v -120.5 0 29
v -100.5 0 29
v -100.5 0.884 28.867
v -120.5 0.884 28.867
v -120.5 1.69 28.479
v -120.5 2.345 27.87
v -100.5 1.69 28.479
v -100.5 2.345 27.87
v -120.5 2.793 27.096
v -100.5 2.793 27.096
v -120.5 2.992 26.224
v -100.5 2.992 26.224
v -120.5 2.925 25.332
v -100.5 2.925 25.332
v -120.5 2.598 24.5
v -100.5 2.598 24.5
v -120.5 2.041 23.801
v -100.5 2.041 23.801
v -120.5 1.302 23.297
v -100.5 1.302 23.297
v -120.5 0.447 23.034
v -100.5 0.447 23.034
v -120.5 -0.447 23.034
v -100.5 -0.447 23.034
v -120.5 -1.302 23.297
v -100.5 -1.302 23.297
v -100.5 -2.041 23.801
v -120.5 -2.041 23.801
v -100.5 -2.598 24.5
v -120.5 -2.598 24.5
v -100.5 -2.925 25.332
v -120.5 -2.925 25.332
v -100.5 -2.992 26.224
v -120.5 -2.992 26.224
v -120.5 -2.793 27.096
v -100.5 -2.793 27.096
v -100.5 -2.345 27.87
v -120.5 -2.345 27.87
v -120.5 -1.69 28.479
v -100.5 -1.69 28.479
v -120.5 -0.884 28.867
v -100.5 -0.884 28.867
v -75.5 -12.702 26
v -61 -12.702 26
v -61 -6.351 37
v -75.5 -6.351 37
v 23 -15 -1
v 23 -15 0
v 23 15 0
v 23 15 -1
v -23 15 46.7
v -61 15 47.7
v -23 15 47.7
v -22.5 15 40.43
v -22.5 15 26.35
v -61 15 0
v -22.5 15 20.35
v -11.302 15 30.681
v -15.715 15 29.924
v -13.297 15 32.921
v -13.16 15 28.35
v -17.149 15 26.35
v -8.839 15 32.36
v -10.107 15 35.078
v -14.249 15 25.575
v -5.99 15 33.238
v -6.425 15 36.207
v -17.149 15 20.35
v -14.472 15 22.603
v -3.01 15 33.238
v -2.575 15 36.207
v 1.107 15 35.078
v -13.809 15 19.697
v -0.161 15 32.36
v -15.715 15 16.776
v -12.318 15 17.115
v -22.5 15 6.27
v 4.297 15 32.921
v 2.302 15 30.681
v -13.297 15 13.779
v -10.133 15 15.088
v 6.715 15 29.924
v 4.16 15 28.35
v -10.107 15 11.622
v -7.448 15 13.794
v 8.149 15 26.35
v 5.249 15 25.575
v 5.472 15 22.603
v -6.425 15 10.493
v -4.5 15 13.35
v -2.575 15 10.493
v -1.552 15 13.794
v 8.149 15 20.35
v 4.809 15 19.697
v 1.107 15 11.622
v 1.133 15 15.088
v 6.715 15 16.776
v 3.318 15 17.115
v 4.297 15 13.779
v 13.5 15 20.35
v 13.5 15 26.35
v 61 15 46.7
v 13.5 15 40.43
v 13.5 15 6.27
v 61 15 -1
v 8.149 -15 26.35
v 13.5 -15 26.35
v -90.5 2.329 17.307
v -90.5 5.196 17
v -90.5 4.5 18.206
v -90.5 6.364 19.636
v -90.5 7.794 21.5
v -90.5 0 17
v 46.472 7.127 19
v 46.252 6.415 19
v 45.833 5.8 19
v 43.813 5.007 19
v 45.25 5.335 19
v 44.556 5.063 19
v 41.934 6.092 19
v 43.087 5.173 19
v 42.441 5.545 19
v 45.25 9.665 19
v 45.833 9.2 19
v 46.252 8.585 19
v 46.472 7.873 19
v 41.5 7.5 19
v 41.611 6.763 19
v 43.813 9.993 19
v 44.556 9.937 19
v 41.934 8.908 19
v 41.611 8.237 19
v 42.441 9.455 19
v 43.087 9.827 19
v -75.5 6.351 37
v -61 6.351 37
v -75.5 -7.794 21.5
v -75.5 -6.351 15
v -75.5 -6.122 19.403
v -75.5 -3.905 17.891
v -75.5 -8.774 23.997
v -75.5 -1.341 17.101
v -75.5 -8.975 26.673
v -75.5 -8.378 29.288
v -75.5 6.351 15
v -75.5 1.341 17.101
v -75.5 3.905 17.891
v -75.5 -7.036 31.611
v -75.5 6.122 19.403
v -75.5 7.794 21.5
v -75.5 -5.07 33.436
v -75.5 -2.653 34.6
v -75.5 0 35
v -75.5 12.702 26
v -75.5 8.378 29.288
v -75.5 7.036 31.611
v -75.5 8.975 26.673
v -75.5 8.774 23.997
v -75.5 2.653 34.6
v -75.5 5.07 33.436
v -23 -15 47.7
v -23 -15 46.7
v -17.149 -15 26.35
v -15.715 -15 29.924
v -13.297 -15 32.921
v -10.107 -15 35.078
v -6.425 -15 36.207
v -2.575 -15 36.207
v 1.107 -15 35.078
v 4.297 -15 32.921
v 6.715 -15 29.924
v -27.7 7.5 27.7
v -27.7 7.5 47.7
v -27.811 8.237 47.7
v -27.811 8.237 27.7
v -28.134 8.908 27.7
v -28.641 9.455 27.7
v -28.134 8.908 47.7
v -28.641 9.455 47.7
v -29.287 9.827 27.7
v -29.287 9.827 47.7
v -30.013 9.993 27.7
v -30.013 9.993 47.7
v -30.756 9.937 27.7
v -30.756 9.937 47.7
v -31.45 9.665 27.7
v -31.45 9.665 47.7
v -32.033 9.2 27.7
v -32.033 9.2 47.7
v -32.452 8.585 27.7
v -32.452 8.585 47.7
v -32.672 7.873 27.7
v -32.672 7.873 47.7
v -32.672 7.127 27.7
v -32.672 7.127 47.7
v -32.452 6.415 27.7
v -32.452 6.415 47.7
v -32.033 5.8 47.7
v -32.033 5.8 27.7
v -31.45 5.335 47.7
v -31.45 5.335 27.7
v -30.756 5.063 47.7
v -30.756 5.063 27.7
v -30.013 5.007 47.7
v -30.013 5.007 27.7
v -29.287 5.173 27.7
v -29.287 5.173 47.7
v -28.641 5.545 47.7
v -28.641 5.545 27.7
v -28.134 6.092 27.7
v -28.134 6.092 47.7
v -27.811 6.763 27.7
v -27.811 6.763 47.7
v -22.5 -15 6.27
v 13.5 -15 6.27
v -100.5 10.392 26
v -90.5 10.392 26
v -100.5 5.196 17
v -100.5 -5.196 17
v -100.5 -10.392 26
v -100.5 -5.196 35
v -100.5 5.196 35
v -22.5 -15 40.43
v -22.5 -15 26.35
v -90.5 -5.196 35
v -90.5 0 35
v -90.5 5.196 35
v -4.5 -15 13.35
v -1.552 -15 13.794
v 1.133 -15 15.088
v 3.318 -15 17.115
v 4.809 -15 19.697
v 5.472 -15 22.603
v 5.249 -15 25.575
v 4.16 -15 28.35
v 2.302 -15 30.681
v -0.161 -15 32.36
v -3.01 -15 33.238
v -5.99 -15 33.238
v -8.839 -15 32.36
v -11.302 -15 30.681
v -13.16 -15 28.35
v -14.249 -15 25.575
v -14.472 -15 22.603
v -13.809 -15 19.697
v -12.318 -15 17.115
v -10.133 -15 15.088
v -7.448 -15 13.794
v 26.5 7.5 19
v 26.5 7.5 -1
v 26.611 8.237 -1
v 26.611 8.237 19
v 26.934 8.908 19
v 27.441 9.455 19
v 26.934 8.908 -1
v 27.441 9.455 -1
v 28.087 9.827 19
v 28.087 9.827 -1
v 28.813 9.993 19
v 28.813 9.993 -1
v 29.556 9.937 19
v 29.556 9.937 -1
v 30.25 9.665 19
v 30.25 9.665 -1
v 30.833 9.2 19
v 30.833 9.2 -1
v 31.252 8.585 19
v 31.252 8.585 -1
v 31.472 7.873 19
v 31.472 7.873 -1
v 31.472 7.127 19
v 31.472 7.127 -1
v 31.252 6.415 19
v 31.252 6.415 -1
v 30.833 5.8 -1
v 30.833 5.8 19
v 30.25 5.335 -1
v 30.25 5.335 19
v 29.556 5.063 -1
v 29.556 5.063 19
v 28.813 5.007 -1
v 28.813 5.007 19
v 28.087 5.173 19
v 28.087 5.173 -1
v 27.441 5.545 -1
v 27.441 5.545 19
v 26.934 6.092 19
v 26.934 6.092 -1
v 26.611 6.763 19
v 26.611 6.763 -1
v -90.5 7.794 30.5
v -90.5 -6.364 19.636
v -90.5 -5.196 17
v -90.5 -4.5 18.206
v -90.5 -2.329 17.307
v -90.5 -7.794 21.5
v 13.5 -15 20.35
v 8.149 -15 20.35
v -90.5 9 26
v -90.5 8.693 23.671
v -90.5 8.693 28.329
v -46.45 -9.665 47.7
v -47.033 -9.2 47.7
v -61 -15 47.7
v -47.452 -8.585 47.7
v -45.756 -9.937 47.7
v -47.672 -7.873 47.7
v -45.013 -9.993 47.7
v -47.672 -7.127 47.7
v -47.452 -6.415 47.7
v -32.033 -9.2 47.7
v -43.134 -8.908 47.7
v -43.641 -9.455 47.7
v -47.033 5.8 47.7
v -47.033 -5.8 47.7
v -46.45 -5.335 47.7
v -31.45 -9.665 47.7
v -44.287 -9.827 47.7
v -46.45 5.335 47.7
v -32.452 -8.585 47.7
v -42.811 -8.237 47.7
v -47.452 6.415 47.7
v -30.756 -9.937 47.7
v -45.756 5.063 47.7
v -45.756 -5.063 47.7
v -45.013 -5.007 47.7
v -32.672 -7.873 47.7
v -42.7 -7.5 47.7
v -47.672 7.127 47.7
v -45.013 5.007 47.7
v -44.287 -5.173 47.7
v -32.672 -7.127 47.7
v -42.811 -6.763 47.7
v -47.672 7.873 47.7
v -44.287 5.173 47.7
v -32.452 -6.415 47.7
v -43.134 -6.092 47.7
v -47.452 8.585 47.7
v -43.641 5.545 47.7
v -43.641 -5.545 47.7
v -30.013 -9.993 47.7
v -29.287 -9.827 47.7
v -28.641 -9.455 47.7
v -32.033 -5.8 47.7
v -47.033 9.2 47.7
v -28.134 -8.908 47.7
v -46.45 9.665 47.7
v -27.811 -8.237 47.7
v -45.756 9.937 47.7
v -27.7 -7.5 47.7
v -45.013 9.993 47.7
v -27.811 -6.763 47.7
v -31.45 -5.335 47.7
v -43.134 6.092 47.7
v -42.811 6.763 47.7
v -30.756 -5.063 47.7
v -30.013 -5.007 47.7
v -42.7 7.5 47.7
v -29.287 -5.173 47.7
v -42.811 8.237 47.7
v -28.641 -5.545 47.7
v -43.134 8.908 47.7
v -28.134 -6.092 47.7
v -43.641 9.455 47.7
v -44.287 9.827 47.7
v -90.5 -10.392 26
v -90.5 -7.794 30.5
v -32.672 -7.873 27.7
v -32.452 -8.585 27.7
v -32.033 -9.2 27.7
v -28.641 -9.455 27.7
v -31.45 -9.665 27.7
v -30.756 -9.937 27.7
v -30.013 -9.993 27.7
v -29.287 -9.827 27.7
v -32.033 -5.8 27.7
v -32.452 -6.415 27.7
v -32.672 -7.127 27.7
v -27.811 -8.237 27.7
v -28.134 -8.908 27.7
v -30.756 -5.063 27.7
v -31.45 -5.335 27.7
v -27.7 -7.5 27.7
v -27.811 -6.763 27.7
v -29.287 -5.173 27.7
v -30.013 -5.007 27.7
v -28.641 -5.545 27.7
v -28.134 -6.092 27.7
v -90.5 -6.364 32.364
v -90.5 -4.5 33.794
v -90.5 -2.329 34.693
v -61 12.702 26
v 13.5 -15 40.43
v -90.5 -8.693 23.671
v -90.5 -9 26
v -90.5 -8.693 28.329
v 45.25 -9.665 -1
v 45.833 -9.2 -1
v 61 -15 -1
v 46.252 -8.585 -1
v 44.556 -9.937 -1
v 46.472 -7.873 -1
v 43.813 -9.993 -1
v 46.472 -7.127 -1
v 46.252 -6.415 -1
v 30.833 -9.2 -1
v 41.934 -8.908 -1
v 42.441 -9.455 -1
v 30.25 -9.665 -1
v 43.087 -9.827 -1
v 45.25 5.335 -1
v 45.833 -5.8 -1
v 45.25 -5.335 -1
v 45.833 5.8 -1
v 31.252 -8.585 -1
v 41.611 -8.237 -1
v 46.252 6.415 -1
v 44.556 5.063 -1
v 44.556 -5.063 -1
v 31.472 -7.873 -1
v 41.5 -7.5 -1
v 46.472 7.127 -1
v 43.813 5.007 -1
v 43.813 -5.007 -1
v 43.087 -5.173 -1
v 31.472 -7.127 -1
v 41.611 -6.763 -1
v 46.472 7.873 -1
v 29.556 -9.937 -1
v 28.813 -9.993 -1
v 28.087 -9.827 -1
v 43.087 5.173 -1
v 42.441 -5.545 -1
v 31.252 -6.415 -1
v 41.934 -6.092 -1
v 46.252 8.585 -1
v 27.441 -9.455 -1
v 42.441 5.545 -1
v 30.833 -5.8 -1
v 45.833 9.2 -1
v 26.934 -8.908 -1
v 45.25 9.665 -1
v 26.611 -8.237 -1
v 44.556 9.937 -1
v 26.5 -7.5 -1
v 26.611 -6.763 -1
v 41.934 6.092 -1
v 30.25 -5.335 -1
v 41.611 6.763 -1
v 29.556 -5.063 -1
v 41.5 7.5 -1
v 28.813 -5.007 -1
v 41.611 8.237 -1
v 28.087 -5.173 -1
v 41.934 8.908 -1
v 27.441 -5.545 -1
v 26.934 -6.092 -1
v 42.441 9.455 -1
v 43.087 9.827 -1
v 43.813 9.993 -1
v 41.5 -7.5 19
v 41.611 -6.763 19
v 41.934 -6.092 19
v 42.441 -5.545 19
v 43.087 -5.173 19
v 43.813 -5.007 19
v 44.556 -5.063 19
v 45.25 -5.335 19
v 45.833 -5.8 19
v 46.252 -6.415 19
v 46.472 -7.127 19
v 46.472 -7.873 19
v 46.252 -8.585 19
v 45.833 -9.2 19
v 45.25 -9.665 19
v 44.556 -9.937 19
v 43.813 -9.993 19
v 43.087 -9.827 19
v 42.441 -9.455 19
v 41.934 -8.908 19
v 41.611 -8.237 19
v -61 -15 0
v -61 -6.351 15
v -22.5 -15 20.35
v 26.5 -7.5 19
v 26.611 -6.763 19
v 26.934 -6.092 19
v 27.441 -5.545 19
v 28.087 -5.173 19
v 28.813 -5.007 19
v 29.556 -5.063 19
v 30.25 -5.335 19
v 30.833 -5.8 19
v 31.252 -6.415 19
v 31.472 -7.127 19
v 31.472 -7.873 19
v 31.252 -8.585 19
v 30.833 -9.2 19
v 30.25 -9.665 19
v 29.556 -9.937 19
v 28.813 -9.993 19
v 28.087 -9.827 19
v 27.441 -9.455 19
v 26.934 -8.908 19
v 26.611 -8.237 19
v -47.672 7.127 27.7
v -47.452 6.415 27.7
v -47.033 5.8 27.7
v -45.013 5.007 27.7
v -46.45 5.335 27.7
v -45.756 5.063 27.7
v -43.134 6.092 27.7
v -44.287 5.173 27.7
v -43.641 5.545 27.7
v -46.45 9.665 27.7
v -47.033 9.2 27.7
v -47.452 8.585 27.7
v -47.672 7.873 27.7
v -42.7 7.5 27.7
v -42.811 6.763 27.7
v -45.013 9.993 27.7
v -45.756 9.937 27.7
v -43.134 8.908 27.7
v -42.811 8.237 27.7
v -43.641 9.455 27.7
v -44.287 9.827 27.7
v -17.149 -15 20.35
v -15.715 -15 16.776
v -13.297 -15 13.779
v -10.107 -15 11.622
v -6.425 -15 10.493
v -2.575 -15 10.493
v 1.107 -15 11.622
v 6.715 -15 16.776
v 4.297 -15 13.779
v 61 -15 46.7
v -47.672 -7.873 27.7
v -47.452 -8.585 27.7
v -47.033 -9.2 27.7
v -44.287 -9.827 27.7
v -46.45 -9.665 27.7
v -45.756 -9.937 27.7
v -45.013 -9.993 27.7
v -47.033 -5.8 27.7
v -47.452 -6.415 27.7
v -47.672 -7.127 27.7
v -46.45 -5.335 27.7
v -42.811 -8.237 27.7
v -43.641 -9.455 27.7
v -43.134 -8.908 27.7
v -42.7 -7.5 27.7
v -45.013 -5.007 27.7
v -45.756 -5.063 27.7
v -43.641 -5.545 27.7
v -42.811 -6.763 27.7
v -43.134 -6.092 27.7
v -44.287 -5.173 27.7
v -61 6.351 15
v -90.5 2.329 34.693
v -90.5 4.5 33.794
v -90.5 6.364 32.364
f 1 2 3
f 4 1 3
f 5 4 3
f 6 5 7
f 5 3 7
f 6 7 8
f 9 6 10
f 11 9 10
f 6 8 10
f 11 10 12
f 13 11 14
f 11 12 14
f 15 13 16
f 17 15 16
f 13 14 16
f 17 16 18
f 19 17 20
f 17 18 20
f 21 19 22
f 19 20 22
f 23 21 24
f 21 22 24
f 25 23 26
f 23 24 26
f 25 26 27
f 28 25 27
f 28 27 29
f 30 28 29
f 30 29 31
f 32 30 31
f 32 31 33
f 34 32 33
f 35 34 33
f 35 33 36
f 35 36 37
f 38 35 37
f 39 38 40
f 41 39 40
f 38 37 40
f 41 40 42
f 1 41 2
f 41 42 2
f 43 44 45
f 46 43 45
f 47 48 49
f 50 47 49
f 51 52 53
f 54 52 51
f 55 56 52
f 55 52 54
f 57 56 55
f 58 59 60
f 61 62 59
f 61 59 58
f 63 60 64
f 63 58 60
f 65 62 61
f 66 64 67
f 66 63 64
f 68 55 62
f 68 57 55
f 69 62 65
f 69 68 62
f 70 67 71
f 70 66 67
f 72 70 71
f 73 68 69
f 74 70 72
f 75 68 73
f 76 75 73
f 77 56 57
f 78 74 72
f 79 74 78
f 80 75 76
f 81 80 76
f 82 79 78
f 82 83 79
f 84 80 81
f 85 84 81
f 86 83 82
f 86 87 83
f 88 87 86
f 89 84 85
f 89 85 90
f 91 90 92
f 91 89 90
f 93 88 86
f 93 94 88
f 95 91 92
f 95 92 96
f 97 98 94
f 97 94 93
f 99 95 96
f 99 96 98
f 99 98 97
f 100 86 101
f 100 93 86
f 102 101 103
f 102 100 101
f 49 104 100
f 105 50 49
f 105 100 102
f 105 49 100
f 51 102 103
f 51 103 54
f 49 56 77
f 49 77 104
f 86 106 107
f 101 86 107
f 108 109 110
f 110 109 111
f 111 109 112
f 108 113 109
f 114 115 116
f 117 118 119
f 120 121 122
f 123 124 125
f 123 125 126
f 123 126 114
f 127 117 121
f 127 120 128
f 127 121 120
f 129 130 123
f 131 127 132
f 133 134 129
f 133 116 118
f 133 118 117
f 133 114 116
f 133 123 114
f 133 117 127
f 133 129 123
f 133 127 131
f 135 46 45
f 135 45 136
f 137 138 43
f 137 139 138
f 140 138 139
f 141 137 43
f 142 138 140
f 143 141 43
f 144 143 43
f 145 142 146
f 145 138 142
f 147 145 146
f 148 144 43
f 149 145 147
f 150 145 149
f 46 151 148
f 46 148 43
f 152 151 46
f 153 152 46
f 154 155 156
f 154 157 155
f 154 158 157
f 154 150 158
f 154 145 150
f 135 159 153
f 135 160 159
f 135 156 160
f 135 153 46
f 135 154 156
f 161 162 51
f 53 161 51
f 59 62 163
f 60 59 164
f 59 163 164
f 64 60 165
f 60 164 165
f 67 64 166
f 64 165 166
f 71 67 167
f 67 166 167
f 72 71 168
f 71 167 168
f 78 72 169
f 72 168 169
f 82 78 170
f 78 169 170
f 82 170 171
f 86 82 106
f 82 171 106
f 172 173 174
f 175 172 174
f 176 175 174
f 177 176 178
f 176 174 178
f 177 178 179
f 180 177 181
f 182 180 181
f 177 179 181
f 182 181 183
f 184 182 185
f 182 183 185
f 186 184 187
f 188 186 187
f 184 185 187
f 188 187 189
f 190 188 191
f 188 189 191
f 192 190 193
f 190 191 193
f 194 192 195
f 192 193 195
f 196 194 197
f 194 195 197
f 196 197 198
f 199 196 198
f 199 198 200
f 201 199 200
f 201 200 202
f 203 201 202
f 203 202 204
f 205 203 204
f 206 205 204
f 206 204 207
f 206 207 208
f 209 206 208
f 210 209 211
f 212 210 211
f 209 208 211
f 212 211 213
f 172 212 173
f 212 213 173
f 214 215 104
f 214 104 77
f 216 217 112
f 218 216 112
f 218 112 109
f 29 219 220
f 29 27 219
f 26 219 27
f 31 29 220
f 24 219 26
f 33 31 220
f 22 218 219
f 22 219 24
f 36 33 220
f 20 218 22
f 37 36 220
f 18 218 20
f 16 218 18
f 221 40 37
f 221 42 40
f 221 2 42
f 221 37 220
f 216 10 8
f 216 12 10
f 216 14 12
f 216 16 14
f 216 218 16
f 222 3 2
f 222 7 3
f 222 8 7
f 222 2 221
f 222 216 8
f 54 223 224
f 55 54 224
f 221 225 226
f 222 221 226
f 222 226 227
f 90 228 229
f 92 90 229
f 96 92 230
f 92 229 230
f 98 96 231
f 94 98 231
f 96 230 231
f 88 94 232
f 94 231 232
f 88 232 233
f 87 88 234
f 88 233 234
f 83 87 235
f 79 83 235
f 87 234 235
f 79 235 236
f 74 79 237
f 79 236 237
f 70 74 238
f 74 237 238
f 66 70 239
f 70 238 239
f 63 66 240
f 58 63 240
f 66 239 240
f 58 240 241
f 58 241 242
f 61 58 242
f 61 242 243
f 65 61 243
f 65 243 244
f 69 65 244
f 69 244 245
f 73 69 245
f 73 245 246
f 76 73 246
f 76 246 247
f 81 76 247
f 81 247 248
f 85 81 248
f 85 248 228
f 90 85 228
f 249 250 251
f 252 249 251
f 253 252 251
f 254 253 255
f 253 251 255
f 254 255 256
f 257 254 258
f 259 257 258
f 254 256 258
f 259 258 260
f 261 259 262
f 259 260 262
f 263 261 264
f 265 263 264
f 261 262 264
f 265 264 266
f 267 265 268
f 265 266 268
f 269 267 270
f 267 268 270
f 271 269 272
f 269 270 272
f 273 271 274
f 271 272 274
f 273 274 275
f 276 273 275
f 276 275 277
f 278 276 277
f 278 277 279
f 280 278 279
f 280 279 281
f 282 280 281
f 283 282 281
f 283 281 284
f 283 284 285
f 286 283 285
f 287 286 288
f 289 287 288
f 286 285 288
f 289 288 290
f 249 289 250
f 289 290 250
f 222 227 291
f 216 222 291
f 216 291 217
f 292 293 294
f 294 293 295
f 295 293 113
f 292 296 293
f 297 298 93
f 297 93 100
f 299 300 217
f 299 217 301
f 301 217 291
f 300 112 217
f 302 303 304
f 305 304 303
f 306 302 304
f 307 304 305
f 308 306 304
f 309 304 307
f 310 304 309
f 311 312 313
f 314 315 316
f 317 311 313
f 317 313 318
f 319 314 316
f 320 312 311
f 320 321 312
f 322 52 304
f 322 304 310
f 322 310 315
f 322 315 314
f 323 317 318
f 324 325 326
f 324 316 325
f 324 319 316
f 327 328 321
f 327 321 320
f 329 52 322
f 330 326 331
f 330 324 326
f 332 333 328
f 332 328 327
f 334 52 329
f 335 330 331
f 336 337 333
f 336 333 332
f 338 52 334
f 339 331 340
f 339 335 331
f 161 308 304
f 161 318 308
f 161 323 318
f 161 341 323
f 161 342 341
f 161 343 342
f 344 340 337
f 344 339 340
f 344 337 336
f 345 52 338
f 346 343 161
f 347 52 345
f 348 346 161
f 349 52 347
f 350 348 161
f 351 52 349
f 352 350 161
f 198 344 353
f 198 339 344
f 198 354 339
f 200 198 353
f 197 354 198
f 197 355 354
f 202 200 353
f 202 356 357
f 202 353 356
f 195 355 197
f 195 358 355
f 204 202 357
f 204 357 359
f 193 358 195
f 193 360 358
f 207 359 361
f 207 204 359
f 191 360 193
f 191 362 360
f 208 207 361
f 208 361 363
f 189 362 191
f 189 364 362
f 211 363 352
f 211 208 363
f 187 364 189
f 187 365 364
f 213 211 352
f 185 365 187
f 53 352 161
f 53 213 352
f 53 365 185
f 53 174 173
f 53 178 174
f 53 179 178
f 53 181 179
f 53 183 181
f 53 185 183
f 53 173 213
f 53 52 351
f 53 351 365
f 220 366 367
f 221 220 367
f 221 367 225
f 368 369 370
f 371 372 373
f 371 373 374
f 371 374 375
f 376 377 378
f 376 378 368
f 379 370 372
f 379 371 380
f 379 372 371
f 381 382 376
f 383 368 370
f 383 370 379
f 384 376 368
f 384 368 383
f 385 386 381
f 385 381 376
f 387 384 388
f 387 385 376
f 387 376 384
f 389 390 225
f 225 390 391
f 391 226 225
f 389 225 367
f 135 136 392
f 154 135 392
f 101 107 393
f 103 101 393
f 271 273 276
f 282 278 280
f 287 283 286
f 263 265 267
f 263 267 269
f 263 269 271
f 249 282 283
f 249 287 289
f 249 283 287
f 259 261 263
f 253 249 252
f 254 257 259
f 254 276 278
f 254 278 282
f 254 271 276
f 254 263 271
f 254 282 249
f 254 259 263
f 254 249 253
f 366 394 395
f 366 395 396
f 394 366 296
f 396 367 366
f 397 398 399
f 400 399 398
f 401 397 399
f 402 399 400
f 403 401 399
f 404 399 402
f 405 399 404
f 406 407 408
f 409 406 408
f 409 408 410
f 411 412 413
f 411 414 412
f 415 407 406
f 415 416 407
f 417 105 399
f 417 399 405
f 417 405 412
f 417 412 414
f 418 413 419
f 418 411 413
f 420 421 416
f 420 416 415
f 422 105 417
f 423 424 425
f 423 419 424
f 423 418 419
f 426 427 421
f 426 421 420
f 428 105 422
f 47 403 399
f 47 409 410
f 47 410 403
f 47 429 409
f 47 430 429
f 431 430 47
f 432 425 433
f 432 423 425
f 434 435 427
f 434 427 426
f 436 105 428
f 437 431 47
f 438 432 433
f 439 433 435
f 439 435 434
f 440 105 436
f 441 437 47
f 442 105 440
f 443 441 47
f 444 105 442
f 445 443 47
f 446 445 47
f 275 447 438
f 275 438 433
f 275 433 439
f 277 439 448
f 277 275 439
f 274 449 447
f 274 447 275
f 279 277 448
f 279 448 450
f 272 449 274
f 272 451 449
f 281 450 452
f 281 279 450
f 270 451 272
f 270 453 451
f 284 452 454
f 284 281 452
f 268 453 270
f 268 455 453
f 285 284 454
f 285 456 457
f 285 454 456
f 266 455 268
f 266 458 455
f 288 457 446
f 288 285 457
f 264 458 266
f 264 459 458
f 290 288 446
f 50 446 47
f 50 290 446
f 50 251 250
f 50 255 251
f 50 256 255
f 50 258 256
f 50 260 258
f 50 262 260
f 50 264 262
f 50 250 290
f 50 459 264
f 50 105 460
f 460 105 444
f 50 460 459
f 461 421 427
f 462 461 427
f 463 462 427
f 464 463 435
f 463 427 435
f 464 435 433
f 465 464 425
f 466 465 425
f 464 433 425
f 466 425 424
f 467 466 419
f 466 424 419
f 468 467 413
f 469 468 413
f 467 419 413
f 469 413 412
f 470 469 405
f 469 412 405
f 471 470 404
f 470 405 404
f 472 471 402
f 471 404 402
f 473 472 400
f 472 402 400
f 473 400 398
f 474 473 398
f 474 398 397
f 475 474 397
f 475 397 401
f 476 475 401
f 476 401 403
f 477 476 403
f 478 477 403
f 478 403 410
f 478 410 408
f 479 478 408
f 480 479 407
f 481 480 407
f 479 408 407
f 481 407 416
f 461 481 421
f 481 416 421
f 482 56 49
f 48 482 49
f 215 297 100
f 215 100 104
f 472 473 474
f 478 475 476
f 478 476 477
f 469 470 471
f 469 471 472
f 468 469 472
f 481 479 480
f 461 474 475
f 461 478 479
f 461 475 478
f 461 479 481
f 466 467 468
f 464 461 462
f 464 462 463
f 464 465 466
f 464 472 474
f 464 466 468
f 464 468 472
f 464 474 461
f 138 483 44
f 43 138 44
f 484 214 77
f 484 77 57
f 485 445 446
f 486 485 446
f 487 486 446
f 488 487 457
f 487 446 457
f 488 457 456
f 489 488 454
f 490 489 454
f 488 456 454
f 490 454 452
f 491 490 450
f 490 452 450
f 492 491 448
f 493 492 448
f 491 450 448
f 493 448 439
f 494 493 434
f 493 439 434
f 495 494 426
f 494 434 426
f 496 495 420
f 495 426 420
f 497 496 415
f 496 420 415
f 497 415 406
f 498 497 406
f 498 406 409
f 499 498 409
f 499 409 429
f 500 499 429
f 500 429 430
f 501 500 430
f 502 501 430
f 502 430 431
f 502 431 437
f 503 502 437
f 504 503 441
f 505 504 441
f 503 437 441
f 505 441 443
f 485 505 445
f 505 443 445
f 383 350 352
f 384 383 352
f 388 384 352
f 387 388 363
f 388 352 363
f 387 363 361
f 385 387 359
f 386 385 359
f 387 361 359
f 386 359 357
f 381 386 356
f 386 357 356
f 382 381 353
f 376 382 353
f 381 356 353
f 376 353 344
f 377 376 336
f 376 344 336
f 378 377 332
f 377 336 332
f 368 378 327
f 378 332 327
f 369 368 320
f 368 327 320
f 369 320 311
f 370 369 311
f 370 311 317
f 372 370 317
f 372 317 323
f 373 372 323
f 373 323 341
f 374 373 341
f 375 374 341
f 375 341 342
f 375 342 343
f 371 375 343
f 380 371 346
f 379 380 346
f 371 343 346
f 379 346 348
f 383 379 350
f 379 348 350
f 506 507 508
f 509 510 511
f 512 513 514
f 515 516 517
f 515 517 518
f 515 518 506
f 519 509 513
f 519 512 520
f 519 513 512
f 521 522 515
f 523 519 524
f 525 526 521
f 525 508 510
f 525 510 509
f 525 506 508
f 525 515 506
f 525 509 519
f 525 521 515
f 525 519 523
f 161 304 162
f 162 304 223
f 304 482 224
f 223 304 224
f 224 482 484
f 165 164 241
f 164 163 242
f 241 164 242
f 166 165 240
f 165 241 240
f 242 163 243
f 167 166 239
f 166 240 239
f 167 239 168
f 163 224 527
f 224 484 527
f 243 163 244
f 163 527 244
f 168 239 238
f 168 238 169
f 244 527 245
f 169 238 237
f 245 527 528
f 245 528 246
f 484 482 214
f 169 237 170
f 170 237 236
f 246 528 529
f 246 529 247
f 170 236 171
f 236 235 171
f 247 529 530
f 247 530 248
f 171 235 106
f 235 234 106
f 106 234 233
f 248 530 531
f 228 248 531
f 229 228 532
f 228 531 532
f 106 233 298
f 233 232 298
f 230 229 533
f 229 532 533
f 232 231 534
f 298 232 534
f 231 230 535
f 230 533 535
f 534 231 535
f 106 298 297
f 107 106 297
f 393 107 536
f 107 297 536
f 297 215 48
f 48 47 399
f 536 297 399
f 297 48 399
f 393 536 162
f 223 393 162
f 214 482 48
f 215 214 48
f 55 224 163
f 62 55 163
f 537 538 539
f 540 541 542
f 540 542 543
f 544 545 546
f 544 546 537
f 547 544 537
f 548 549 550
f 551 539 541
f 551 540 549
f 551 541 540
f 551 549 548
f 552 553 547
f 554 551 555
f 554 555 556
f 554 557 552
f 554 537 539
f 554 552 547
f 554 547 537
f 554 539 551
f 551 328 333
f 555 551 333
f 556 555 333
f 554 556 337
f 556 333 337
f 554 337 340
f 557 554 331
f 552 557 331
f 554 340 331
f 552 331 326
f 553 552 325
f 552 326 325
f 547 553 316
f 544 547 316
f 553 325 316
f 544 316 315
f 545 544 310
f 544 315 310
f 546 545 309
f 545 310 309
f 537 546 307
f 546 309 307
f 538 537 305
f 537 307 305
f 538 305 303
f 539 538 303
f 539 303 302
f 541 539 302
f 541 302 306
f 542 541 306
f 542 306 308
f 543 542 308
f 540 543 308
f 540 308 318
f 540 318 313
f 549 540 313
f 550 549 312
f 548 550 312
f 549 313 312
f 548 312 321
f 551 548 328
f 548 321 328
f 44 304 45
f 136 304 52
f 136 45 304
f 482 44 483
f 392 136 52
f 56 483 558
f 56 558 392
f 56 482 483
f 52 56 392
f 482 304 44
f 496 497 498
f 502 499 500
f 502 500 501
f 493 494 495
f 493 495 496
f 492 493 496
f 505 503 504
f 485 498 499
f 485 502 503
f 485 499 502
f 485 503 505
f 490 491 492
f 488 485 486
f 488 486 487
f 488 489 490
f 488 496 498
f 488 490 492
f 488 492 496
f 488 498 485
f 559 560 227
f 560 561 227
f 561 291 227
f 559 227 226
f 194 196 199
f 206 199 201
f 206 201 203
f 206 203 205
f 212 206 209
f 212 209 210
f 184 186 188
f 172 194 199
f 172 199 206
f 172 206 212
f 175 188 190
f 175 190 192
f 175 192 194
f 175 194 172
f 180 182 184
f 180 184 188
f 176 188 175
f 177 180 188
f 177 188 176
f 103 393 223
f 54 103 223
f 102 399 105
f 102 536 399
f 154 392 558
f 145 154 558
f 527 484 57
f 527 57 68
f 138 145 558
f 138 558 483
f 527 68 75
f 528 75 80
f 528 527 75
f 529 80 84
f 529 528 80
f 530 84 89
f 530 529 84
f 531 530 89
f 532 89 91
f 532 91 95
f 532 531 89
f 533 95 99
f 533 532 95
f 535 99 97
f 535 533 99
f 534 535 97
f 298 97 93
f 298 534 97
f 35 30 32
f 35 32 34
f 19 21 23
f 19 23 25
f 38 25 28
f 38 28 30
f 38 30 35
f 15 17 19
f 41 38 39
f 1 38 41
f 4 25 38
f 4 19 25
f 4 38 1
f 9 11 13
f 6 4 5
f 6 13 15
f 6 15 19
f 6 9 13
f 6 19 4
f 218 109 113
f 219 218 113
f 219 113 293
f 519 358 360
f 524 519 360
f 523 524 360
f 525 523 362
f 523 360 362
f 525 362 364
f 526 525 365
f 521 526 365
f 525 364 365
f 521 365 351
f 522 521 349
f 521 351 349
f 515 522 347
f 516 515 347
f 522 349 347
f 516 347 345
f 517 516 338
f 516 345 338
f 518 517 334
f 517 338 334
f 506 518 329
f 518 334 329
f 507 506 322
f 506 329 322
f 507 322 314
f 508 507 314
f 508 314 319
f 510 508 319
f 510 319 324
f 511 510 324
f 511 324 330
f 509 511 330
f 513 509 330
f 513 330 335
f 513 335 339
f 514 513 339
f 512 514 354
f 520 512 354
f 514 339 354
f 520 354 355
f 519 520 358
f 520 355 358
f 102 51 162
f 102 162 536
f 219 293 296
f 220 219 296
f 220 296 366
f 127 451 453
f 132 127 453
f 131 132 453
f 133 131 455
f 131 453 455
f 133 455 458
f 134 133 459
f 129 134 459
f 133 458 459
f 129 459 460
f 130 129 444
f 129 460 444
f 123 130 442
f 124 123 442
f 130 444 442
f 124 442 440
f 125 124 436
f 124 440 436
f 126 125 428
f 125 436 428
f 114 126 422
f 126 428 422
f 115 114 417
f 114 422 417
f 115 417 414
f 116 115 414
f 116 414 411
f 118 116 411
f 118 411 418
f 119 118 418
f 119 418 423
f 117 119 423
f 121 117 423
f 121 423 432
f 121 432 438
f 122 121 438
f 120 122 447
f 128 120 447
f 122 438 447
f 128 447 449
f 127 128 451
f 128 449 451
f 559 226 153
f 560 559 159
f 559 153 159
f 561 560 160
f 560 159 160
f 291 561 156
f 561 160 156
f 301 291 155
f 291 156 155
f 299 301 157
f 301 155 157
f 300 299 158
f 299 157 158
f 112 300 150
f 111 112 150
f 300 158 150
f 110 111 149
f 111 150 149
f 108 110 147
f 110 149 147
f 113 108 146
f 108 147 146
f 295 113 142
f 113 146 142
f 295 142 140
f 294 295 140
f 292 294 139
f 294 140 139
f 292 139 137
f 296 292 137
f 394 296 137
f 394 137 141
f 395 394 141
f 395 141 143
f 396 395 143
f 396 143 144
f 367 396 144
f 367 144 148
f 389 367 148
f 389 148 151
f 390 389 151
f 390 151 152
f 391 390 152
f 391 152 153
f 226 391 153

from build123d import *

# Parameters (mm, degrees)
IZIM1_W                     = 122
IZIM1_H                     = 30
Y_KSEKLIK_EKSTR_ZYON1_DEPTH = 46.7
IZIM2_W                     = 38
IZIM2_H                     = 30
Y_KSEKLIK_EKSTR_ZYON2_DEPTH = 1
IZIM3_R                     = 2.5
KES_EKSTR_ZYON1_DEPTH       = 20
KES_EKSTR_ZYON2_DEPTH       = 38
IZIM5_R                     = 10
KES_EKSTR_ZYON3_DEPTH       = 38
Y_KSEKLIK_EKSTR_ZYON3_DEPTH = 14.5
IZIM7_R                     = 9
Y_KSEKLIK_EKSTR_ZYON4_DEPTH = 15
IZIM8_W                     = 38
IZIM8_H                     = 30
Y_KSEKLIK_EKSTR_ZYON5_DEPTH = 1
IZIM9_R                     = 2.5
KES_EKSTR_ZYON4_DEPTH       = 20
Y_KSEKLIK_EKSTR_ZYON6_DEPTH = 10
IZIM11_R                    = 3
Y_KSEKLIK_EKSTR_ZYON7_DEPTH = 20


with BuildPart() as part:
    # Çizim1 → Yükseklik-Ekstrüzyon1 (new body)
    with BuildSketch(Plane.XY):
        Rectangle(IZIM1_W, IZIM1_H)
    extrude(amount=Y_KSEKLIK_EKSTR_ZYON1_DEPTH)

    # Çizim2 → Yükseklik-Ekstrüzyon2 (add)
    with BuildSketch(Plane(origin=(0, 0, 0), x_dir=(-1, 0, 0), z_dir=(0, 0, -1))):
        with Locations((-42, 0)):
            Rectangle(IZIM2_W, IZIM2_H)
    extrude(amount=Y_KSEKLIK_EKSTR_ZYON2_DEPTH)

    # Çizim3 → Kes-Ekstrüzyon1 (cut)
    with BuildSketch(Plane(origin=(0, 0, -1), x_dir=(-1, 0, 0), z_dir=(0, 0, -1))):
        with Locations((-29, 7.5)):
            Circle(IZIM3_R)
        with Locations((-44, 7.5)):
            Circle(IZIM3_R)
        with Locations((-44, -7.5)):
            Circle(IZIM3_R)
        with Locations((-29, -7.5)):
            Circle(IZIM3_R)
    extrude(amount=-KES_EKSTR_ZYON1_DEPTH, mode=Mode.SUBTRACT)

    # Çizim4 → Kes-Ekstrüzyon2 (cut)
    with BuildSketch(Plane.XZ.offset(15)):
        with BuildLine():
            Line((13.5, 6.27), (-22.5, 6.27))
            Line((-22.5, 6.27), (-22.5, 20.35))
            Line((-22.5, 20.35), (-17.149110641, 20.35))
            ThreePointArc((-17.149110641, 20.35), (-4.5, 10.35), (8.149110641, 20.35))
            Line((8.149110641, 20.35), (13.5, 20.35))
            Line((13.5, 20.35), (13.5, 6.27))
        make_face()
        with BuildLine():
            Line((13.5, 40.43), (-22.5, 40.43))
            Line((-22.5, 40.43), (-22.5, 26.35))
            Line((-22.5, 26.35), (-17.149110641, 26.35))
            ThreePointArc((-17.149110641, 26.35), (-4.5, 36.35), (8.149110641, 26.35))
            Line((8.149110641, 26.35), (13.5, 26.35))
            Line((13.5, 26.35), (13.5, 40.43))
        make_face()
    extrude(amount=-KES_EKSTR_ZYON2_DEPTH, mode=Mode.SUBTRACT)

    # Çizim5 → Kes-Ekstrüzyon3 (cut)
    with BuildSketch(Plane.XZ.offset(15)):
        with Locations(Location((-4.5, 23.35, 0), (0, 0, 270))):
            Circle(IZIM5_R)
    extrude(amount=-KES_EKSTR_ZYON3_DEPTH, mode=Mode.SUBTRACT)

    # Çizim6 → Yükseklik-Ekstrüzyon3 (add)
    with BuildSketch(Plane.ZY.offset(61)):
        Polygon((26, 12.701705922), (15, 6.350852961), (15, -6.350852961), (26, -12.701705922), (37, -6.350852961), (37, 6.350852961), align=None)
    extrude(amount=Y_KSEKLIK_EKSTR_ZYON3_DEPTH)

    # Çizim7 → Yükseklik-Ekstrüzyon4 (add)
    with BuildSketch(Plane.ZY.offset(75.5)):
        with Locations((26, 0)):
            Circle(IZIM7_R)
    extrude(amount=Y_KSEKLIK_EKSTR_ZYON4_DEPTH)

    # Çizim8 → Yükseklik-Ekstrüzyon5 (add)
    with BuildSketch(Plane.XY.offset(46.7)):
        with Locations((-42, 0)):
            Rectangle(IZIM8_W, IZIM8_H)
    extrude(amount=Y_KSEKLIK_EKSTR_ZYON5_DEPTH)

    # Çizim9 → Kes-Ekstrüzyon4 (cut)
    with BuildSketch(Plane.XY.offset(47.7)):
        with Locations((-45.2, 7.5)):
            Circle(IZIM9_R)
        with Locations((-45.2, -7.5)):
            Circle(IZIM9_R)
        with Locations((-30.2, -7.5)):
            Circle(IZIM9_R)
        with Locations((-30.2, 7.5)):
            Circle(IZIM9_R)
    extrude(amount=-KES_EKSTR_ZYON4_DEPTH, mode=Mode.SUBTRACT)

    # Çizim10 → Yükseklik-Ekstrüzyon6 (add)
    with BuildSketch(Plane.ZY.offset(90.5)):
        Polygon((26, 10.392304845), (17, 5.196152423), (17, -5.196152423), (26, -10.392304845), (35, -5.196152423), (35, 5.196152423), align=None)
    extrude(amount=Y_KSEKLIK_EKSTR_ZYON6_DEPTH)

    # Çizim11 → Yükseklik-Ekstrüzyon7 (add)
    with BuildSketch(Plane.ZY.offset(100.5)):
        with Locations((26, 0)):
            Circle(IZIM11_R)
    extrude(amount=Y_KSEKLIK_EKSTR_ZYON7_DEPTH)


solid = part.part
